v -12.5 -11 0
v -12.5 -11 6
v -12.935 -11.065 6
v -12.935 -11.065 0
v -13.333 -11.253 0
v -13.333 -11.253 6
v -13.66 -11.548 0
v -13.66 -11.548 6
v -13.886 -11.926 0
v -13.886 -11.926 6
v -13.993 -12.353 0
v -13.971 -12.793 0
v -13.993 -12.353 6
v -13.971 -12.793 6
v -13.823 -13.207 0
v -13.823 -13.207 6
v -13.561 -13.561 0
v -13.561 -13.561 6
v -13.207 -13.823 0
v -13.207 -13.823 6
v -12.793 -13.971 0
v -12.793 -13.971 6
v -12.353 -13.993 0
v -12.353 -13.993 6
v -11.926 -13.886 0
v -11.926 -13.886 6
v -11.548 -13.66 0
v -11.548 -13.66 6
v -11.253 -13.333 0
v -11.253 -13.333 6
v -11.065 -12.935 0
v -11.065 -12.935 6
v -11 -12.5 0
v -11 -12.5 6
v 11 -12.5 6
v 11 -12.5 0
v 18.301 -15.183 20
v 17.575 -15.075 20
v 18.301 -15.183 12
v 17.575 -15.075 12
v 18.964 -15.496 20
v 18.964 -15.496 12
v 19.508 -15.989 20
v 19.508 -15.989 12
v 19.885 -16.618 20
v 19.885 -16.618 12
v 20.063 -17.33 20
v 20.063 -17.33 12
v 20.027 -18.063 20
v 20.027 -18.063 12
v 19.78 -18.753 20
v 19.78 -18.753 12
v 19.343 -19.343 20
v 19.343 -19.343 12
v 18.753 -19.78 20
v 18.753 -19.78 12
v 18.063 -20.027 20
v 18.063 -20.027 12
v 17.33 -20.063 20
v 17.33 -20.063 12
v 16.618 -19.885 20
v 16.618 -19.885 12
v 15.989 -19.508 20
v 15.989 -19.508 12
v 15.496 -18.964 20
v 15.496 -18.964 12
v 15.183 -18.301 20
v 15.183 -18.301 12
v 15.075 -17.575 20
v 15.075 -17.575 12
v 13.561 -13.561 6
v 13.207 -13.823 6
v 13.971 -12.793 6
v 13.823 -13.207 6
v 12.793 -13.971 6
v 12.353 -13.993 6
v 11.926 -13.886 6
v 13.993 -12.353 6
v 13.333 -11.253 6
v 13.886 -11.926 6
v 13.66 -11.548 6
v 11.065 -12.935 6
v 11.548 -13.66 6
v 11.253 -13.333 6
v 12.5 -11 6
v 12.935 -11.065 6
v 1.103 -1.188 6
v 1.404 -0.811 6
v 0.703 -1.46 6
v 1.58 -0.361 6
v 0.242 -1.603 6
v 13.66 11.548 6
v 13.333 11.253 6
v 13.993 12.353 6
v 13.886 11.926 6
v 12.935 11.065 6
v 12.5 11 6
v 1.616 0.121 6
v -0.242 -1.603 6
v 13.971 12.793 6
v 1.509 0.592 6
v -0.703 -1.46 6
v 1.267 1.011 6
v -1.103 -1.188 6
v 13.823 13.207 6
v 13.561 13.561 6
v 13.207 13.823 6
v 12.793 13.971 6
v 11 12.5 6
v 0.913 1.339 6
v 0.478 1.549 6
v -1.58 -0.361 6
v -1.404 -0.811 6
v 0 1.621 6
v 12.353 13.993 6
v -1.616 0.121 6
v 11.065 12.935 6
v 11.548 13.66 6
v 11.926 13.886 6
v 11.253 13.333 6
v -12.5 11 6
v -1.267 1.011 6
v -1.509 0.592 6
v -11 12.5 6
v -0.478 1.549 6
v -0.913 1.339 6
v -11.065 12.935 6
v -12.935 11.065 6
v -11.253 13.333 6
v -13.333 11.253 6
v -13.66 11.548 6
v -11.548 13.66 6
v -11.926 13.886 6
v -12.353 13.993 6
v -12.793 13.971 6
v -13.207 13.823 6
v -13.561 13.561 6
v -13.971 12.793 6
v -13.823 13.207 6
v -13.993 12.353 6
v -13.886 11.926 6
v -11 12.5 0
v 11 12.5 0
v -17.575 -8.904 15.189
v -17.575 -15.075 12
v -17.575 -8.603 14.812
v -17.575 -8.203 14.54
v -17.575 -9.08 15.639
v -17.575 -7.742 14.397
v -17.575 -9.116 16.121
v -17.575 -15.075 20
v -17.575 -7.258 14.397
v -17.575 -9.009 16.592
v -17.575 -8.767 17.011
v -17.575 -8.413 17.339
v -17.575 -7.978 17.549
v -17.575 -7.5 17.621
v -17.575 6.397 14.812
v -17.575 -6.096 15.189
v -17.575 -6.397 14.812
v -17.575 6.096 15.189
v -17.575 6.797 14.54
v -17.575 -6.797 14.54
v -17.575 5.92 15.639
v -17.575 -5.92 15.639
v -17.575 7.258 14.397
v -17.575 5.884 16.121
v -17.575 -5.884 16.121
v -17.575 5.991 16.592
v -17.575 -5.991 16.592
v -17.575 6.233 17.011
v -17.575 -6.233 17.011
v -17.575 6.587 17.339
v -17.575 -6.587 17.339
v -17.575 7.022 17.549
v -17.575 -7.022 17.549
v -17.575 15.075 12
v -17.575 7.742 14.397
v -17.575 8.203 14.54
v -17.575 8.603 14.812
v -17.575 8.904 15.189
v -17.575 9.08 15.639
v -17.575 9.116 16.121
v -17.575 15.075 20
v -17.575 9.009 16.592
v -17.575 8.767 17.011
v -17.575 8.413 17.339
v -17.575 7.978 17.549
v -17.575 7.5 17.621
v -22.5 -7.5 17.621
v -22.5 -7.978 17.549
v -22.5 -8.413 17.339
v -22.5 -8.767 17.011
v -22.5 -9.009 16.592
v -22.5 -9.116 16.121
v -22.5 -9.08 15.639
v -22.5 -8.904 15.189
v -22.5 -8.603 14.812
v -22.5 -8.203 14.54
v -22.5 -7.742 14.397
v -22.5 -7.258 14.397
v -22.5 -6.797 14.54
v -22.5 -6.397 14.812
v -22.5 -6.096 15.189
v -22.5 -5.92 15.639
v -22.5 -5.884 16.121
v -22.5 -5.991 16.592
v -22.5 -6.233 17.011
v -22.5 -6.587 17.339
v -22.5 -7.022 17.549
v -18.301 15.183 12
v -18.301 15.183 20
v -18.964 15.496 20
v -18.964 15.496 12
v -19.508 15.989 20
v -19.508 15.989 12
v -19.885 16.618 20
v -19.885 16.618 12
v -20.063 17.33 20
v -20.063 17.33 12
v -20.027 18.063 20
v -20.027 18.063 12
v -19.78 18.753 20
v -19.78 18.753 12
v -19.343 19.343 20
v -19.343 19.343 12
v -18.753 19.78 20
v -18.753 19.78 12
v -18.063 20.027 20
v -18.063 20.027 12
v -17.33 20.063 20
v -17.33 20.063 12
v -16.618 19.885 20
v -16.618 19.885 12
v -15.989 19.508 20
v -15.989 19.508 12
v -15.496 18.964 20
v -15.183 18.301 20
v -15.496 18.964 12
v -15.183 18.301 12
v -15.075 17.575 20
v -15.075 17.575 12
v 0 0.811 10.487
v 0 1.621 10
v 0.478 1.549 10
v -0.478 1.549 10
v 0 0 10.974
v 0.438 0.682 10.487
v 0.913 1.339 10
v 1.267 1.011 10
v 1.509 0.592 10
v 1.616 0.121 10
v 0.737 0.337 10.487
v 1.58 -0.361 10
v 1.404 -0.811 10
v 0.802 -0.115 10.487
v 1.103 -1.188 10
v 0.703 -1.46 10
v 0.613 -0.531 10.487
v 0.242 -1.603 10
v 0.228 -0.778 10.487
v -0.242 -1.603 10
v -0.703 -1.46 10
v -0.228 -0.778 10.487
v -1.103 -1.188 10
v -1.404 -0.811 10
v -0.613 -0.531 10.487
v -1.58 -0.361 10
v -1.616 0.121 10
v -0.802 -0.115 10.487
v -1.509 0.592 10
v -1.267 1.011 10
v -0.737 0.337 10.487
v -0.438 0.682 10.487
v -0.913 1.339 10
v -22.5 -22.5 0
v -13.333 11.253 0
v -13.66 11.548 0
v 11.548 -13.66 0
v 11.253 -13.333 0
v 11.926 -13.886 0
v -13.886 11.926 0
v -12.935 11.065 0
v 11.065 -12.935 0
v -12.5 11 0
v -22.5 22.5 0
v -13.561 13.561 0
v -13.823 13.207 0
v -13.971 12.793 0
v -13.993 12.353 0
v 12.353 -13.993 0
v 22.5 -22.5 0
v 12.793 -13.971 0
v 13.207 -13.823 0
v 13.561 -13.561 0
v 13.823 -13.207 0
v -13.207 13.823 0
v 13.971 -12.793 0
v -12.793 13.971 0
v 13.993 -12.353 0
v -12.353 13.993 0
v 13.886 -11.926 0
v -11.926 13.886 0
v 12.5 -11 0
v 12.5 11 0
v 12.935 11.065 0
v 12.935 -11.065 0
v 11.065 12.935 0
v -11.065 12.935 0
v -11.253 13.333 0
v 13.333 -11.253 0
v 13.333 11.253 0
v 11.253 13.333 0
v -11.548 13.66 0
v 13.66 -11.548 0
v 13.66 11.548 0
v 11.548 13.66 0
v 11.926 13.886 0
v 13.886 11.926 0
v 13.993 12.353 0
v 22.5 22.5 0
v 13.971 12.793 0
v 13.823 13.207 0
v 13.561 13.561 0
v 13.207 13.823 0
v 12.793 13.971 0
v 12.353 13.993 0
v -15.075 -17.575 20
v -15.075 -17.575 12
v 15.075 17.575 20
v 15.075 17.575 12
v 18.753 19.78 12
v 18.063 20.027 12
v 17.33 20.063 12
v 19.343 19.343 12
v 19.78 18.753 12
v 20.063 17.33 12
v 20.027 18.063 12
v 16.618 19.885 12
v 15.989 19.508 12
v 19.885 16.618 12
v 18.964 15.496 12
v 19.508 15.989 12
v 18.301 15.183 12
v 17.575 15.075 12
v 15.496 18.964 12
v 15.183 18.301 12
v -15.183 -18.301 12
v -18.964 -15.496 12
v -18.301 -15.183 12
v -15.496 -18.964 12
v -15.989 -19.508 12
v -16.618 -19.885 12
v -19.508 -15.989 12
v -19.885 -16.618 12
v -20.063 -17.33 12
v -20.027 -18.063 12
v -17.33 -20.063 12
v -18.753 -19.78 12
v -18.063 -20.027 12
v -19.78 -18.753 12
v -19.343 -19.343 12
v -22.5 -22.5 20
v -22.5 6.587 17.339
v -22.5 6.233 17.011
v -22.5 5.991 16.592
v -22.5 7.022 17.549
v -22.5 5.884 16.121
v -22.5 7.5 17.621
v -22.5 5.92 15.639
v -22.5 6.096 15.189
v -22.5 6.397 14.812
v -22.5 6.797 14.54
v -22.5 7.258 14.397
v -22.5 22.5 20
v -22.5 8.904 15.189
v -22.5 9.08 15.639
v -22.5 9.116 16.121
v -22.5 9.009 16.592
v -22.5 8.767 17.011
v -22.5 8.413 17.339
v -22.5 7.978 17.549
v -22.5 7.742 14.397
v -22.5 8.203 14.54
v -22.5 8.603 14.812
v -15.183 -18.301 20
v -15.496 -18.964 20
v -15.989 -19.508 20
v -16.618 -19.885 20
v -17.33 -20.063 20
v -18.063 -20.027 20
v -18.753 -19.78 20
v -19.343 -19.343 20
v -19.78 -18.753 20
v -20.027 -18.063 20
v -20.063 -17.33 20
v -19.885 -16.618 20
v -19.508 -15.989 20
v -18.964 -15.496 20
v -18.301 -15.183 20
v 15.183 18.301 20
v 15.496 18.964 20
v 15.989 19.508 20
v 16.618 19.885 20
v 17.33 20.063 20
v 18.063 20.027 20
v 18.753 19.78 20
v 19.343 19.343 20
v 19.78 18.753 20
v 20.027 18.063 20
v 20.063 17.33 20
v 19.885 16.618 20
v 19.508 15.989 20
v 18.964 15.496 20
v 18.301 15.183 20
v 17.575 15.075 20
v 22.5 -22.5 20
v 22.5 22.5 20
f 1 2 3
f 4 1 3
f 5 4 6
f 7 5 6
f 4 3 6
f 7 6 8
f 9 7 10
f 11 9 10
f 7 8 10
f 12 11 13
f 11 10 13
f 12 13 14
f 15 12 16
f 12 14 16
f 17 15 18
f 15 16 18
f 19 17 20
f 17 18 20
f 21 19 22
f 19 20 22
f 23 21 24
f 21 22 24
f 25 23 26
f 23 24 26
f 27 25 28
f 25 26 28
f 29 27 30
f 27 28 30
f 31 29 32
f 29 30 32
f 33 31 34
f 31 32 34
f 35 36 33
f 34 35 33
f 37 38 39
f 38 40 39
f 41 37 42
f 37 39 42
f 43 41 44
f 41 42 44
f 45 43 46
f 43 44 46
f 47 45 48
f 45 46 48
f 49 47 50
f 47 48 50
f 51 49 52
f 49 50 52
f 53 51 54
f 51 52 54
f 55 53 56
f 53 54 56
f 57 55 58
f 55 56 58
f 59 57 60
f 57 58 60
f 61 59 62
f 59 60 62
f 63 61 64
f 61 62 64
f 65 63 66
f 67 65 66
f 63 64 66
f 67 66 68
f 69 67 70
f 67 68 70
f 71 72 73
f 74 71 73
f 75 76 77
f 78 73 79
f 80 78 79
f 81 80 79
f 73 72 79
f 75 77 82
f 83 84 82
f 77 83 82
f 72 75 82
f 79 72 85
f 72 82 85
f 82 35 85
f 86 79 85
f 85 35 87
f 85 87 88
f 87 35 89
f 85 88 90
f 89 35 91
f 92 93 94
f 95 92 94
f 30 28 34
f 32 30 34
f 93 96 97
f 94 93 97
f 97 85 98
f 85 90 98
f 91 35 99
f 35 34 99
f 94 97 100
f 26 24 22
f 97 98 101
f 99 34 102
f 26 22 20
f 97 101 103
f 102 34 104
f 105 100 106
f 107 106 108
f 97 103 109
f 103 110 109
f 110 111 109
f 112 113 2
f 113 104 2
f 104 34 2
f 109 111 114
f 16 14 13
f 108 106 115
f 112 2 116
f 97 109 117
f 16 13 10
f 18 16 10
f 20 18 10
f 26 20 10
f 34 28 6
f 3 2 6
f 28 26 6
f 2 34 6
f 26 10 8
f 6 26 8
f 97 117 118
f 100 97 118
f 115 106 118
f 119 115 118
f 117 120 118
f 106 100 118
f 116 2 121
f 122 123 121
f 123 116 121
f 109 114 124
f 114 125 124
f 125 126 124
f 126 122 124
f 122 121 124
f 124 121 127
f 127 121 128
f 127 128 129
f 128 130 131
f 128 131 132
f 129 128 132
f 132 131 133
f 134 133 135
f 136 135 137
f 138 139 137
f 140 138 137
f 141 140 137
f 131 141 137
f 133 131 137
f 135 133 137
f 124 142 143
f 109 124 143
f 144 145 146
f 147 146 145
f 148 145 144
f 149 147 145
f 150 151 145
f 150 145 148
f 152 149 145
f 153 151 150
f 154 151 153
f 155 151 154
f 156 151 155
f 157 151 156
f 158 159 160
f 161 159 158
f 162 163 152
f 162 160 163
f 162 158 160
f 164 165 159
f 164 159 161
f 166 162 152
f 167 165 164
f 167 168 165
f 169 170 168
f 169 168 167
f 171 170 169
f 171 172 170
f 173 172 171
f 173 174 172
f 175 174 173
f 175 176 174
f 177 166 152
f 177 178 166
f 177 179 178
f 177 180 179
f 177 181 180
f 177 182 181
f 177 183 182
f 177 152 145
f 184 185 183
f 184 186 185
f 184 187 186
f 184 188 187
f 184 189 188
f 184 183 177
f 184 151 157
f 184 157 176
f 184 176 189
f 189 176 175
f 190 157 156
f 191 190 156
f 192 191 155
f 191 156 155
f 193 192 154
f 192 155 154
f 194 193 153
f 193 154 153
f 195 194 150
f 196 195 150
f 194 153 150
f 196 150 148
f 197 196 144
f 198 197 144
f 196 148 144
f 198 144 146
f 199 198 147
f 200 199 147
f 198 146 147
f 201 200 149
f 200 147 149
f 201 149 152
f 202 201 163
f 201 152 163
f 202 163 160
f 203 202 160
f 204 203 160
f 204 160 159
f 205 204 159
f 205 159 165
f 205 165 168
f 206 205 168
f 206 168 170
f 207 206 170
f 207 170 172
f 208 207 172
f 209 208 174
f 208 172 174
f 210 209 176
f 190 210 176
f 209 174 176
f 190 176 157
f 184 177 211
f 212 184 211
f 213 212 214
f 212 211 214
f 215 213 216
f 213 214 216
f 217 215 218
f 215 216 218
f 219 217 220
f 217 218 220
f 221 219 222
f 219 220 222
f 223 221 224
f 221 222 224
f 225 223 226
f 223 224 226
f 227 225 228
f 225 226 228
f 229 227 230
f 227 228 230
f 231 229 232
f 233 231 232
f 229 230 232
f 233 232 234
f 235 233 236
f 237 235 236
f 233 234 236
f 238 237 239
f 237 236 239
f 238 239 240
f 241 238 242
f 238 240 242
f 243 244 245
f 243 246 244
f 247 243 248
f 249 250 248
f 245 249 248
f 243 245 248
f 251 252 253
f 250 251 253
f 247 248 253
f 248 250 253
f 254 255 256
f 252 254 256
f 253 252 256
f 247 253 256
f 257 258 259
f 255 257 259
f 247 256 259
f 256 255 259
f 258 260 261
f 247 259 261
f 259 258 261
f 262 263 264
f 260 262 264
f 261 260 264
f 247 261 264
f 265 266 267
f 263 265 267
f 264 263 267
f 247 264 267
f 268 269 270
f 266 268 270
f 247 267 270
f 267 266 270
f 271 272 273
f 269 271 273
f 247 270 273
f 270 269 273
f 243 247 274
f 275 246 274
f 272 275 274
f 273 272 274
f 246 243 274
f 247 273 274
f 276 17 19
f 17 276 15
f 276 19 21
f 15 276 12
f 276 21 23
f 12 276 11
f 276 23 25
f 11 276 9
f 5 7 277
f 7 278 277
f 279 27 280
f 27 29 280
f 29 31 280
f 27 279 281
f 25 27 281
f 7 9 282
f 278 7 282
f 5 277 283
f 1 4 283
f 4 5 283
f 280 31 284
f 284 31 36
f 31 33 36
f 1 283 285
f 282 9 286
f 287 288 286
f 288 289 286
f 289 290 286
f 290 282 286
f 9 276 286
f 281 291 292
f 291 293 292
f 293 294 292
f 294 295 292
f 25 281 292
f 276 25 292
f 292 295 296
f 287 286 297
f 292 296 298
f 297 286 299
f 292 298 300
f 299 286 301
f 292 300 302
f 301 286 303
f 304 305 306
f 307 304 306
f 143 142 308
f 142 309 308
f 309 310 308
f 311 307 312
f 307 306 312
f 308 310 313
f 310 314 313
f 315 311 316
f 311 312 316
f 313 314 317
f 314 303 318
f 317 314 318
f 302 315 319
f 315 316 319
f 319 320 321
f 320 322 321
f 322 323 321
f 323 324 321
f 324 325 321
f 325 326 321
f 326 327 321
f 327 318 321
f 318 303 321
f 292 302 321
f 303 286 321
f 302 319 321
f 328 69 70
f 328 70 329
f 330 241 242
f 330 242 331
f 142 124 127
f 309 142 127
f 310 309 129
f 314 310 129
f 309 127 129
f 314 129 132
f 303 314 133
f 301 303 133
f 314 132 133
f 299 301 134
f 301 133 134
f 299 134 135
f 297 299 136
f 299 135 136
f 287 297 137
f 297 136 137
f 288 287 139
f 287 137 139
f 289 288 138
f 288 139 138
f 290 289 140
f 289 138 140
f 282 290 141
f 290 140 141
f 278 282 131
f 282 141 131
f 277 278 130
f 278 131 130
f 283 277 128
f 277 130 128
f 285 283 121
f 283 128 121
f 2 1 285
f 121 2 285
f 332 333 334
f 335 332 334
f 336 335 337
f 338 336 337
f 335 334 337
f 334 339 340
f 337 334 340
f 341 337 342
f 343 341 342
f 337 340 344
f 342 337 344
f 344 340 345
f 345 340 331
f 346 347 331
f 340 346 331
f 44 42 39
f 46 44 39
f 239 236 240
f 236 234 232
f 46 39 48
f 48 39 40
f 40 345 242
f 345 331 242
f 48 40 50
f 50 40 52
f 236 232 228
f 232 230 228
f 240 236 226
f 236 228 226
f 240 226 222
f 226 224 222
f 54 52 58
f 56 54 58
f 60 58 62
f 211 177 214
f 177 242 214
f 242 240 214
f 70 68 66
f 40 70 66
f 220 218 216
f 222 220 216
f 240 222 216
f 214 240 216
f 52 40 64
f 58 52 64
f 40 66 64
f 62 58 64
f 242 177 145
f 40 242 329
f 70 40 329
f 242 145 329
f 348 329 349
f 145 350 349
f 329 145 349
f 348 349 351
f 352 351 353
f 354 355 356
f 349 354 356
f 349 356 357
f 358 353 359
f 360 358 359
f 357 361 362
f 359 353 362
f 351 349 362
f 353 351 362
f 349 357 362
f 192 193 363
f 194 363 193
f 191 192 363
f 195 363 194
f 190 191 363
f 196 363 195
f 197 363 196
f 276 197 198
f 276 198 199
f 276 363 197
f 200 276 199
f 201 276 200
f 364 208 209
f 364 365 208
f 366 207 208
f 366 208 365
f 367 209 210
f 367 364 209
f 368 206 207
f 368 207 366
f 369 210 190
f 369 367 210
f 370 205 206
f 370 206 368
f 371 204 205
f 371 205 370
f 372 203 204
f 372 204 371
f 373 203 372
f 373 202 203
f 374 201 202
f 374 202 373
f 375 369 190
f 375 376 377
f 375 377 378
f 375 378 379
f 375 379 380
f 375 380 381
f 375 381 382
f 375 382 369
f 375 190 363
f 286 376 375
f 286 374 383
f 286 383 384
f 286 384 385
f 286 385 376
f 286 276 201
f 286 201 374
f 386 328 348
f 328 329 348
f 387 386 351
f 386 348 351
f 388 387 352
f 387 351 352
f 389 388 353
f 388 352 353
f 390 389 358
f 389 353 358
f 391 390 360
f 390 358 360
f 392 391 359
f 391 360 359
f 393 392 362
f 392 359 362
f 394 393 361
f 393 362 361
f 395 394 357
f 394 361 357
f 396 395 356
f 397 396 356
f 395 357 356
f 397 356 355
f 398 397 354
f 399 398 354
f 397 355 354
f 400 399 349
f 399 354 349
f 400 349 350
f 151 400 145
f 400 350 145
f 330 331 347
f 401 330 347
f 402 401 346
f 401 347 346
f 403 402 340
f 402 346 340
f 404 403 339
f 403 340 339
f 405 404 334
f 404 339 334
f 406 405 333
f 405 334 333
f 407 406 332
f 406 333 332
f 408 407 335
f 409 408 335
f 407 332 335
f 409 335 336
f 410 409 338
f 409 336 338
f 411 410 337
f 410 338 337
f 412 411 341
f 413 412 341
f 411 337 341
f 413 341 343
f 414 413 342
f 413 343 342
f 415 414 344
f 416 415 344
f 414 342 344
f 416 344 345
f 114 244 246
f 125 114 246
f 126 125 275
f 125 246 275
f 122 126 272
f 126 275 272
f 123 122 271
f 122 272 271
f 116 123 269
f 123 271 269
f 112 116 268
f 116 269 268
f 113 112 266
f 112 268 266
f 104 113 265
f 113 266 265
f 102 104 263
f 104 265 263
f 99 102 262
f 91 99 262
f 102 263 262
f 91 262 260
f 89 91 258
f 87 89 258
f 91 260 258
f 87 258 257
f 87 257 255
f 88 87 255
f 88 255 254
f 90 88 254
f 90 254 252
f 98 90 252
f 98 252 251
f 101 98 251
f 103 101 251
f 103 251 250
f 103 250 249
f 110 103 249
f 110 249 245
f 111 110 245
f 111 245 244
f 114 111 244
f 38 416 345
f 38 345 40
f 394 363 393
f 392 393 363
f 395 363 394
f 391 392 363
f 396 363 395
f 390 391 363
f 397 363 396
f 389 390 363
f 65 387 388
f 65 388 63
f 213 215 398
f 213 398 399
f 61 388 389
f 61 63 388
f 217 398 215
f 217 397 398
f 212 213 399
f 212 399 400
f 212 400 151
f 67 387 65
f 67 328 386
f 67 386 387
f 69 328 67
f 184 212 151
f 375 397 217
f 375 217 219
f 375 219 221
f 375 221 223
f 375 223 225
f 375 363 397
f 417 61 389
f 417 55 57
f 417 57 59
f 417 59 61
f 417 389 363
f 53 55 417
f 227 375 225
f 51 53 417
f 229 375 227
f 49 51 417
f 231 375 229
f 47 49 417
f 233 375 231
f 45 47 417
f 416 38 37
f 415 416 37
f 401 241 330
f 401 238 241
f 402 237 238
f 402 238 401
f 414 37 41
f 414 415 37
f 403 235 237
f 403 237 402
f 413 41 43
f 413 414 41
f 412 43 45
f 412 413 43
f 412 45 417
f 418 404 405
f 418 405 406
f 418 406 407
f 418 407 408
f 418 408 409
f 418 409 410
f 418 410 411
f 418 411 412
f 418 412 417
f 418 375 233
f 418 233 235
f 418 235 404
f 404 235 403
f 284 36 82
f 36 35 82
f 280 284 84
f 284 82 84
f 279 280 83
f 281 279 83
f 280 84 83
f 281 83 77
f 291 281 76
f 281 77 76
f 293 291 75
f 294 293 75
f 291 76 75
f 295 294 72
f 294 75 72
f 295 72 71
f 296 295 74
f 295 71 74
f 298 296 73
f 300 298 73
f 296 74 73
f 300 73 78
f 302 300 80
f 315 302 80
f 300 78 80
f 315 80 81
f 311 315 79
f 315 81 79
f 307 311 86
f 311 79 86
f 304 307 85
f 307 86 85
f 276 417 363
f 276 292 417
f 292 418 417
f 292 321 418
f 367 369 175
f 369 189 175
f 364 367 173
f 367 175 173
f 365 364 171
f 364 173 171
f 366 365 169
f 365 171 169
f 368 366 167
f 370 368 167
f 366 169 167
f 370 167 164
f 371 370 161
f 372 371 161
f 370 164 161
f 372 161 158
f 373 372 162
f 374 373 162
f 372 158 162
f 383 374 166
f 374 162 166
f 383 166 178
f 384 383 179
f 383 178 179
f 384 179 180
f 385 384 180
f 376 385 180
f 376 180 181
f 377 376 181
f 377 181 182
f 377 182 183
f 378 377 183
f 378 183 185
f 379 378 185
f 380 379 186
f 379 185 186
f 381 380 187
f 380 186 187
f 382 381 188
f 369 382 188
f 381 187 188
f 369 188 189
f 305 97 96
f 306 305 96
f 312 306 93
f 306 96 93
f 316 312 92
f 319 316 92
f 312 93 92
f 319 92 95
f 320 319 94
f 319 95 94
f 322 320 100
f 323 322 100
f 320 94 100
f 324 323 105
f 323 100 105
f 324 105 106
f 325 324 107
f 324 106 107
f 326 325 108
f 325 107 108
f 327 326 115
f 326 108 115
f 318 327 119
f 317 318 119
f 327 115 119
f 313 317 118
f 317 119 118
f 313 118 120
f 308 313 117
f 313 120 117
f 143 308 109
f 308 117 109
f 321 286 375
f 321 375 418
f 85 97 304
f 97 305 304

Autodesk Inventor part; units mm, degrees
ref_plane "YZ Plane" through (0, 0, 0) normal (1, 0, 0) x (0, 1, 0)
ref_plane "XZ Plane" through (0, 0, 0) normal (0, 1, 0) x (-1, 0, 0)
ref_plane "XY Plane" through (0, 0, 0) normal (0, 0, 1) x (1, 0, 0)
sketch "Sketch1" plane through (0, 0, 0) normal (0, 0, 1) x (1, 0, 0)
  line L0 (0, 31.5) -> (0, -31.5) construction
  line L1 (-31.5, 0) -> (31.5, 0) construction
  line L2 (-22.5, 22.5) -> (22.5, 22.5)
  line L3 (22.5, 22.5) -> (22.5, -22.5)
  line L4 (22.5, -22.5) -> (-22.5, -22.5)
  line L5 (-22.5, -22.5) -> (-22.5, 22.5)
  point P0 (0, 0)
  dimension "d0" = 45
  dimension "d1" = 45
extrude "Extrusion1" add sketch "Sketch1" along normal blind 20
sketch "Sketch4" plane through (0, 0, 20) normal (0, 0, 1) x (1, 0, 0)
  line L0 (-31.5, 0) -> (31.5, 0) construction
  line L1 (0, 31.5) -> (0, -31.5) construction
  line L2 (-17.575, 17.575) -> (17.575, 17.575) construction
  line L3 (17.575, 17.575) -> (17.575, -17.575) construction
  line L4 (17.575, -17.575) -> (-17.575, -17.575) construction
  line L5 (-17.575, -17.575) -> (-17.575, 17.575) construction
  point P0 (0, 0)
  dimension "d15" = 35.15
  dimension "d16" = 35.15
hole "Hole2" at (-17.575, 17.575, 20) at (17.575, 17.575, 20) at (17.575, -17.575, 20) at (-17.575, -17.575, 20) at (-17.575, 17.575, 20) at (17.575, 17.575, 20) direction (0, 0, -1) diameter 5 depth 8
sketch "Sketch5" plane through (0, 0, 20) normal (0, 0, 1) x (1, 0, 0)
  circle A0 centre (-17.575, 17.575) radius 2.5 projected
  circle A1 centre (17.575, -17.575) radius 2.5 projected
  line L0 (-17.575, 17.575) -> (17.575, 17.575)
  line L1 (17.575, 17.575) -> (17.575, -17.575)
  line L2 (17.575, -17.575) -> (-17.575, -17.575)
  line L3 (-17.575, -17.575) -> (-17.575, 17.575)
  point P0 (0, 0)
extrude "Extrusion3" cut sketch "Sketch5" against normal blind 8 contours L0 L1 A1 L2 L3 A0 | A0 L3 L0 | L1 L2 A1 picked at (-15.9292, 17.3896) picked at (17.028, -16.0118)
sketch "Sketch6" plane through (-22.5, -22.5, 0) normal (-1, 0, 0) x (0, 0, 1)
  line L0 (0, 45) -> (20, 45) projected
  line L1 (0, 0) -> (20, 0) projected
  line L2 (20, 7.425) -> (12, 7.425) construction
  line L3 (20, 37.575) -> (20, 7.425) construction
  line L4 (12, 37.575) -> (20, 37.575) construction
  line L5 (12, 7.425) -> (12, 37.575) construction
  line L6 (16, 37.575) -> (16, 7.425) construction
  point P0 (0, 22.5)
  point P1 (16, 30)
  point P2 (16, 15)
  dimension "d26" = 15
  dimension "d27" = 15
hole "Hole3" at (-22.5, 7.5, 16) at (-22.5, -7.5, 16) direction (1, 0, 0) diameter 3.242 end up to surface thread size "M4x0.7" class "6H" standard "ANSI Metric M Profile"
sketch "Sketch8" plane through (0, 0, 0) normal (0, 0, -1) x (-1, 0, 0)
  line L0 (22.5, 22.5) -> (-22.5, 22.5) construction
  line L1 (-22.5, 22.5) -> (-22.5, -22.5) construction
  line L2 (-22.5, -22.5) -> (22.5, -22.5) construction
  line L3 (22.5, -22.5) -> (22.5, 22.5) construction
  line L4 (0, -38.5) -> (0, 38.5) construction
  line L5 (-38.5, 0) -> (38.5, 0) construction
  line L6 (-12.5, -12.5) -> (12.5, -12.5)
  line L7 (12.5, -12.5) -> (12.5, 12.5)
  line L8 (12.5, 12.5) -> (-12.5, 12.5)
  line L9 (-12.5, 12.5) -> (-12.5, -12.5)
  point P0 (0, 0)
  dimension "d44" = 25
  dimension "d45" = 25
extrude "Extrusion4" cut sketch "Sketch8" against normal blind 6
sketch "Sketch9" plane through (0, 0, 0) normal (0, 0, -1) x (-1, 0, 0)
  line L0 (12.5, 12.5) -> (12.5, -12.5) construction
  line L1 (12.5, -12.5) -> (-12.5, -12.5) construction
  line L2 (-12.5, -12.5) -> (-12.5, 12.5) construction
  line L3 (-12.5, 12.5) -> (12.5, 12.5) construction
  line L4 (22.5, 22.5) -> (-22.5, 22.5) construction
  line L5 (-22.5, 22.5) -> (-22.5, -22.5) construction
  line L6 (-22.5, -22.5) -> (22.5, -22.5) construction
  line L7 (22.5, -22.5) -> (22.5, 22.5) construction
  line L8 (12.5, -12.5) -> (-12.5, -12.5) construction
  point P0 (0, 0)
hole "Hole5" at (-12.5, 12.5, 0) at (-12.5, -12.5, 0) at (12.5, -12.5, 0) at (12.5, 12.5, 0) direction (0, 0, 1) diameter 3 depth 6
sketch "Sketch10" plane through (0, 0, 6) normal (0, 0, -1) x (-1, 0, 0)
  point P0 (0, 0)
  point P1 (0, 0)
hole "Hole6" at (0, 0, 6) direction (0, 0, 1) diameter 3.242 depth 4 tip angle 118 thread size "M4x0.7" class "6H" standard "ANSI Metric M Profile"
properties part number "Large-cuvette-mount-40mm-V3" material "PC/ABS Plastic"
